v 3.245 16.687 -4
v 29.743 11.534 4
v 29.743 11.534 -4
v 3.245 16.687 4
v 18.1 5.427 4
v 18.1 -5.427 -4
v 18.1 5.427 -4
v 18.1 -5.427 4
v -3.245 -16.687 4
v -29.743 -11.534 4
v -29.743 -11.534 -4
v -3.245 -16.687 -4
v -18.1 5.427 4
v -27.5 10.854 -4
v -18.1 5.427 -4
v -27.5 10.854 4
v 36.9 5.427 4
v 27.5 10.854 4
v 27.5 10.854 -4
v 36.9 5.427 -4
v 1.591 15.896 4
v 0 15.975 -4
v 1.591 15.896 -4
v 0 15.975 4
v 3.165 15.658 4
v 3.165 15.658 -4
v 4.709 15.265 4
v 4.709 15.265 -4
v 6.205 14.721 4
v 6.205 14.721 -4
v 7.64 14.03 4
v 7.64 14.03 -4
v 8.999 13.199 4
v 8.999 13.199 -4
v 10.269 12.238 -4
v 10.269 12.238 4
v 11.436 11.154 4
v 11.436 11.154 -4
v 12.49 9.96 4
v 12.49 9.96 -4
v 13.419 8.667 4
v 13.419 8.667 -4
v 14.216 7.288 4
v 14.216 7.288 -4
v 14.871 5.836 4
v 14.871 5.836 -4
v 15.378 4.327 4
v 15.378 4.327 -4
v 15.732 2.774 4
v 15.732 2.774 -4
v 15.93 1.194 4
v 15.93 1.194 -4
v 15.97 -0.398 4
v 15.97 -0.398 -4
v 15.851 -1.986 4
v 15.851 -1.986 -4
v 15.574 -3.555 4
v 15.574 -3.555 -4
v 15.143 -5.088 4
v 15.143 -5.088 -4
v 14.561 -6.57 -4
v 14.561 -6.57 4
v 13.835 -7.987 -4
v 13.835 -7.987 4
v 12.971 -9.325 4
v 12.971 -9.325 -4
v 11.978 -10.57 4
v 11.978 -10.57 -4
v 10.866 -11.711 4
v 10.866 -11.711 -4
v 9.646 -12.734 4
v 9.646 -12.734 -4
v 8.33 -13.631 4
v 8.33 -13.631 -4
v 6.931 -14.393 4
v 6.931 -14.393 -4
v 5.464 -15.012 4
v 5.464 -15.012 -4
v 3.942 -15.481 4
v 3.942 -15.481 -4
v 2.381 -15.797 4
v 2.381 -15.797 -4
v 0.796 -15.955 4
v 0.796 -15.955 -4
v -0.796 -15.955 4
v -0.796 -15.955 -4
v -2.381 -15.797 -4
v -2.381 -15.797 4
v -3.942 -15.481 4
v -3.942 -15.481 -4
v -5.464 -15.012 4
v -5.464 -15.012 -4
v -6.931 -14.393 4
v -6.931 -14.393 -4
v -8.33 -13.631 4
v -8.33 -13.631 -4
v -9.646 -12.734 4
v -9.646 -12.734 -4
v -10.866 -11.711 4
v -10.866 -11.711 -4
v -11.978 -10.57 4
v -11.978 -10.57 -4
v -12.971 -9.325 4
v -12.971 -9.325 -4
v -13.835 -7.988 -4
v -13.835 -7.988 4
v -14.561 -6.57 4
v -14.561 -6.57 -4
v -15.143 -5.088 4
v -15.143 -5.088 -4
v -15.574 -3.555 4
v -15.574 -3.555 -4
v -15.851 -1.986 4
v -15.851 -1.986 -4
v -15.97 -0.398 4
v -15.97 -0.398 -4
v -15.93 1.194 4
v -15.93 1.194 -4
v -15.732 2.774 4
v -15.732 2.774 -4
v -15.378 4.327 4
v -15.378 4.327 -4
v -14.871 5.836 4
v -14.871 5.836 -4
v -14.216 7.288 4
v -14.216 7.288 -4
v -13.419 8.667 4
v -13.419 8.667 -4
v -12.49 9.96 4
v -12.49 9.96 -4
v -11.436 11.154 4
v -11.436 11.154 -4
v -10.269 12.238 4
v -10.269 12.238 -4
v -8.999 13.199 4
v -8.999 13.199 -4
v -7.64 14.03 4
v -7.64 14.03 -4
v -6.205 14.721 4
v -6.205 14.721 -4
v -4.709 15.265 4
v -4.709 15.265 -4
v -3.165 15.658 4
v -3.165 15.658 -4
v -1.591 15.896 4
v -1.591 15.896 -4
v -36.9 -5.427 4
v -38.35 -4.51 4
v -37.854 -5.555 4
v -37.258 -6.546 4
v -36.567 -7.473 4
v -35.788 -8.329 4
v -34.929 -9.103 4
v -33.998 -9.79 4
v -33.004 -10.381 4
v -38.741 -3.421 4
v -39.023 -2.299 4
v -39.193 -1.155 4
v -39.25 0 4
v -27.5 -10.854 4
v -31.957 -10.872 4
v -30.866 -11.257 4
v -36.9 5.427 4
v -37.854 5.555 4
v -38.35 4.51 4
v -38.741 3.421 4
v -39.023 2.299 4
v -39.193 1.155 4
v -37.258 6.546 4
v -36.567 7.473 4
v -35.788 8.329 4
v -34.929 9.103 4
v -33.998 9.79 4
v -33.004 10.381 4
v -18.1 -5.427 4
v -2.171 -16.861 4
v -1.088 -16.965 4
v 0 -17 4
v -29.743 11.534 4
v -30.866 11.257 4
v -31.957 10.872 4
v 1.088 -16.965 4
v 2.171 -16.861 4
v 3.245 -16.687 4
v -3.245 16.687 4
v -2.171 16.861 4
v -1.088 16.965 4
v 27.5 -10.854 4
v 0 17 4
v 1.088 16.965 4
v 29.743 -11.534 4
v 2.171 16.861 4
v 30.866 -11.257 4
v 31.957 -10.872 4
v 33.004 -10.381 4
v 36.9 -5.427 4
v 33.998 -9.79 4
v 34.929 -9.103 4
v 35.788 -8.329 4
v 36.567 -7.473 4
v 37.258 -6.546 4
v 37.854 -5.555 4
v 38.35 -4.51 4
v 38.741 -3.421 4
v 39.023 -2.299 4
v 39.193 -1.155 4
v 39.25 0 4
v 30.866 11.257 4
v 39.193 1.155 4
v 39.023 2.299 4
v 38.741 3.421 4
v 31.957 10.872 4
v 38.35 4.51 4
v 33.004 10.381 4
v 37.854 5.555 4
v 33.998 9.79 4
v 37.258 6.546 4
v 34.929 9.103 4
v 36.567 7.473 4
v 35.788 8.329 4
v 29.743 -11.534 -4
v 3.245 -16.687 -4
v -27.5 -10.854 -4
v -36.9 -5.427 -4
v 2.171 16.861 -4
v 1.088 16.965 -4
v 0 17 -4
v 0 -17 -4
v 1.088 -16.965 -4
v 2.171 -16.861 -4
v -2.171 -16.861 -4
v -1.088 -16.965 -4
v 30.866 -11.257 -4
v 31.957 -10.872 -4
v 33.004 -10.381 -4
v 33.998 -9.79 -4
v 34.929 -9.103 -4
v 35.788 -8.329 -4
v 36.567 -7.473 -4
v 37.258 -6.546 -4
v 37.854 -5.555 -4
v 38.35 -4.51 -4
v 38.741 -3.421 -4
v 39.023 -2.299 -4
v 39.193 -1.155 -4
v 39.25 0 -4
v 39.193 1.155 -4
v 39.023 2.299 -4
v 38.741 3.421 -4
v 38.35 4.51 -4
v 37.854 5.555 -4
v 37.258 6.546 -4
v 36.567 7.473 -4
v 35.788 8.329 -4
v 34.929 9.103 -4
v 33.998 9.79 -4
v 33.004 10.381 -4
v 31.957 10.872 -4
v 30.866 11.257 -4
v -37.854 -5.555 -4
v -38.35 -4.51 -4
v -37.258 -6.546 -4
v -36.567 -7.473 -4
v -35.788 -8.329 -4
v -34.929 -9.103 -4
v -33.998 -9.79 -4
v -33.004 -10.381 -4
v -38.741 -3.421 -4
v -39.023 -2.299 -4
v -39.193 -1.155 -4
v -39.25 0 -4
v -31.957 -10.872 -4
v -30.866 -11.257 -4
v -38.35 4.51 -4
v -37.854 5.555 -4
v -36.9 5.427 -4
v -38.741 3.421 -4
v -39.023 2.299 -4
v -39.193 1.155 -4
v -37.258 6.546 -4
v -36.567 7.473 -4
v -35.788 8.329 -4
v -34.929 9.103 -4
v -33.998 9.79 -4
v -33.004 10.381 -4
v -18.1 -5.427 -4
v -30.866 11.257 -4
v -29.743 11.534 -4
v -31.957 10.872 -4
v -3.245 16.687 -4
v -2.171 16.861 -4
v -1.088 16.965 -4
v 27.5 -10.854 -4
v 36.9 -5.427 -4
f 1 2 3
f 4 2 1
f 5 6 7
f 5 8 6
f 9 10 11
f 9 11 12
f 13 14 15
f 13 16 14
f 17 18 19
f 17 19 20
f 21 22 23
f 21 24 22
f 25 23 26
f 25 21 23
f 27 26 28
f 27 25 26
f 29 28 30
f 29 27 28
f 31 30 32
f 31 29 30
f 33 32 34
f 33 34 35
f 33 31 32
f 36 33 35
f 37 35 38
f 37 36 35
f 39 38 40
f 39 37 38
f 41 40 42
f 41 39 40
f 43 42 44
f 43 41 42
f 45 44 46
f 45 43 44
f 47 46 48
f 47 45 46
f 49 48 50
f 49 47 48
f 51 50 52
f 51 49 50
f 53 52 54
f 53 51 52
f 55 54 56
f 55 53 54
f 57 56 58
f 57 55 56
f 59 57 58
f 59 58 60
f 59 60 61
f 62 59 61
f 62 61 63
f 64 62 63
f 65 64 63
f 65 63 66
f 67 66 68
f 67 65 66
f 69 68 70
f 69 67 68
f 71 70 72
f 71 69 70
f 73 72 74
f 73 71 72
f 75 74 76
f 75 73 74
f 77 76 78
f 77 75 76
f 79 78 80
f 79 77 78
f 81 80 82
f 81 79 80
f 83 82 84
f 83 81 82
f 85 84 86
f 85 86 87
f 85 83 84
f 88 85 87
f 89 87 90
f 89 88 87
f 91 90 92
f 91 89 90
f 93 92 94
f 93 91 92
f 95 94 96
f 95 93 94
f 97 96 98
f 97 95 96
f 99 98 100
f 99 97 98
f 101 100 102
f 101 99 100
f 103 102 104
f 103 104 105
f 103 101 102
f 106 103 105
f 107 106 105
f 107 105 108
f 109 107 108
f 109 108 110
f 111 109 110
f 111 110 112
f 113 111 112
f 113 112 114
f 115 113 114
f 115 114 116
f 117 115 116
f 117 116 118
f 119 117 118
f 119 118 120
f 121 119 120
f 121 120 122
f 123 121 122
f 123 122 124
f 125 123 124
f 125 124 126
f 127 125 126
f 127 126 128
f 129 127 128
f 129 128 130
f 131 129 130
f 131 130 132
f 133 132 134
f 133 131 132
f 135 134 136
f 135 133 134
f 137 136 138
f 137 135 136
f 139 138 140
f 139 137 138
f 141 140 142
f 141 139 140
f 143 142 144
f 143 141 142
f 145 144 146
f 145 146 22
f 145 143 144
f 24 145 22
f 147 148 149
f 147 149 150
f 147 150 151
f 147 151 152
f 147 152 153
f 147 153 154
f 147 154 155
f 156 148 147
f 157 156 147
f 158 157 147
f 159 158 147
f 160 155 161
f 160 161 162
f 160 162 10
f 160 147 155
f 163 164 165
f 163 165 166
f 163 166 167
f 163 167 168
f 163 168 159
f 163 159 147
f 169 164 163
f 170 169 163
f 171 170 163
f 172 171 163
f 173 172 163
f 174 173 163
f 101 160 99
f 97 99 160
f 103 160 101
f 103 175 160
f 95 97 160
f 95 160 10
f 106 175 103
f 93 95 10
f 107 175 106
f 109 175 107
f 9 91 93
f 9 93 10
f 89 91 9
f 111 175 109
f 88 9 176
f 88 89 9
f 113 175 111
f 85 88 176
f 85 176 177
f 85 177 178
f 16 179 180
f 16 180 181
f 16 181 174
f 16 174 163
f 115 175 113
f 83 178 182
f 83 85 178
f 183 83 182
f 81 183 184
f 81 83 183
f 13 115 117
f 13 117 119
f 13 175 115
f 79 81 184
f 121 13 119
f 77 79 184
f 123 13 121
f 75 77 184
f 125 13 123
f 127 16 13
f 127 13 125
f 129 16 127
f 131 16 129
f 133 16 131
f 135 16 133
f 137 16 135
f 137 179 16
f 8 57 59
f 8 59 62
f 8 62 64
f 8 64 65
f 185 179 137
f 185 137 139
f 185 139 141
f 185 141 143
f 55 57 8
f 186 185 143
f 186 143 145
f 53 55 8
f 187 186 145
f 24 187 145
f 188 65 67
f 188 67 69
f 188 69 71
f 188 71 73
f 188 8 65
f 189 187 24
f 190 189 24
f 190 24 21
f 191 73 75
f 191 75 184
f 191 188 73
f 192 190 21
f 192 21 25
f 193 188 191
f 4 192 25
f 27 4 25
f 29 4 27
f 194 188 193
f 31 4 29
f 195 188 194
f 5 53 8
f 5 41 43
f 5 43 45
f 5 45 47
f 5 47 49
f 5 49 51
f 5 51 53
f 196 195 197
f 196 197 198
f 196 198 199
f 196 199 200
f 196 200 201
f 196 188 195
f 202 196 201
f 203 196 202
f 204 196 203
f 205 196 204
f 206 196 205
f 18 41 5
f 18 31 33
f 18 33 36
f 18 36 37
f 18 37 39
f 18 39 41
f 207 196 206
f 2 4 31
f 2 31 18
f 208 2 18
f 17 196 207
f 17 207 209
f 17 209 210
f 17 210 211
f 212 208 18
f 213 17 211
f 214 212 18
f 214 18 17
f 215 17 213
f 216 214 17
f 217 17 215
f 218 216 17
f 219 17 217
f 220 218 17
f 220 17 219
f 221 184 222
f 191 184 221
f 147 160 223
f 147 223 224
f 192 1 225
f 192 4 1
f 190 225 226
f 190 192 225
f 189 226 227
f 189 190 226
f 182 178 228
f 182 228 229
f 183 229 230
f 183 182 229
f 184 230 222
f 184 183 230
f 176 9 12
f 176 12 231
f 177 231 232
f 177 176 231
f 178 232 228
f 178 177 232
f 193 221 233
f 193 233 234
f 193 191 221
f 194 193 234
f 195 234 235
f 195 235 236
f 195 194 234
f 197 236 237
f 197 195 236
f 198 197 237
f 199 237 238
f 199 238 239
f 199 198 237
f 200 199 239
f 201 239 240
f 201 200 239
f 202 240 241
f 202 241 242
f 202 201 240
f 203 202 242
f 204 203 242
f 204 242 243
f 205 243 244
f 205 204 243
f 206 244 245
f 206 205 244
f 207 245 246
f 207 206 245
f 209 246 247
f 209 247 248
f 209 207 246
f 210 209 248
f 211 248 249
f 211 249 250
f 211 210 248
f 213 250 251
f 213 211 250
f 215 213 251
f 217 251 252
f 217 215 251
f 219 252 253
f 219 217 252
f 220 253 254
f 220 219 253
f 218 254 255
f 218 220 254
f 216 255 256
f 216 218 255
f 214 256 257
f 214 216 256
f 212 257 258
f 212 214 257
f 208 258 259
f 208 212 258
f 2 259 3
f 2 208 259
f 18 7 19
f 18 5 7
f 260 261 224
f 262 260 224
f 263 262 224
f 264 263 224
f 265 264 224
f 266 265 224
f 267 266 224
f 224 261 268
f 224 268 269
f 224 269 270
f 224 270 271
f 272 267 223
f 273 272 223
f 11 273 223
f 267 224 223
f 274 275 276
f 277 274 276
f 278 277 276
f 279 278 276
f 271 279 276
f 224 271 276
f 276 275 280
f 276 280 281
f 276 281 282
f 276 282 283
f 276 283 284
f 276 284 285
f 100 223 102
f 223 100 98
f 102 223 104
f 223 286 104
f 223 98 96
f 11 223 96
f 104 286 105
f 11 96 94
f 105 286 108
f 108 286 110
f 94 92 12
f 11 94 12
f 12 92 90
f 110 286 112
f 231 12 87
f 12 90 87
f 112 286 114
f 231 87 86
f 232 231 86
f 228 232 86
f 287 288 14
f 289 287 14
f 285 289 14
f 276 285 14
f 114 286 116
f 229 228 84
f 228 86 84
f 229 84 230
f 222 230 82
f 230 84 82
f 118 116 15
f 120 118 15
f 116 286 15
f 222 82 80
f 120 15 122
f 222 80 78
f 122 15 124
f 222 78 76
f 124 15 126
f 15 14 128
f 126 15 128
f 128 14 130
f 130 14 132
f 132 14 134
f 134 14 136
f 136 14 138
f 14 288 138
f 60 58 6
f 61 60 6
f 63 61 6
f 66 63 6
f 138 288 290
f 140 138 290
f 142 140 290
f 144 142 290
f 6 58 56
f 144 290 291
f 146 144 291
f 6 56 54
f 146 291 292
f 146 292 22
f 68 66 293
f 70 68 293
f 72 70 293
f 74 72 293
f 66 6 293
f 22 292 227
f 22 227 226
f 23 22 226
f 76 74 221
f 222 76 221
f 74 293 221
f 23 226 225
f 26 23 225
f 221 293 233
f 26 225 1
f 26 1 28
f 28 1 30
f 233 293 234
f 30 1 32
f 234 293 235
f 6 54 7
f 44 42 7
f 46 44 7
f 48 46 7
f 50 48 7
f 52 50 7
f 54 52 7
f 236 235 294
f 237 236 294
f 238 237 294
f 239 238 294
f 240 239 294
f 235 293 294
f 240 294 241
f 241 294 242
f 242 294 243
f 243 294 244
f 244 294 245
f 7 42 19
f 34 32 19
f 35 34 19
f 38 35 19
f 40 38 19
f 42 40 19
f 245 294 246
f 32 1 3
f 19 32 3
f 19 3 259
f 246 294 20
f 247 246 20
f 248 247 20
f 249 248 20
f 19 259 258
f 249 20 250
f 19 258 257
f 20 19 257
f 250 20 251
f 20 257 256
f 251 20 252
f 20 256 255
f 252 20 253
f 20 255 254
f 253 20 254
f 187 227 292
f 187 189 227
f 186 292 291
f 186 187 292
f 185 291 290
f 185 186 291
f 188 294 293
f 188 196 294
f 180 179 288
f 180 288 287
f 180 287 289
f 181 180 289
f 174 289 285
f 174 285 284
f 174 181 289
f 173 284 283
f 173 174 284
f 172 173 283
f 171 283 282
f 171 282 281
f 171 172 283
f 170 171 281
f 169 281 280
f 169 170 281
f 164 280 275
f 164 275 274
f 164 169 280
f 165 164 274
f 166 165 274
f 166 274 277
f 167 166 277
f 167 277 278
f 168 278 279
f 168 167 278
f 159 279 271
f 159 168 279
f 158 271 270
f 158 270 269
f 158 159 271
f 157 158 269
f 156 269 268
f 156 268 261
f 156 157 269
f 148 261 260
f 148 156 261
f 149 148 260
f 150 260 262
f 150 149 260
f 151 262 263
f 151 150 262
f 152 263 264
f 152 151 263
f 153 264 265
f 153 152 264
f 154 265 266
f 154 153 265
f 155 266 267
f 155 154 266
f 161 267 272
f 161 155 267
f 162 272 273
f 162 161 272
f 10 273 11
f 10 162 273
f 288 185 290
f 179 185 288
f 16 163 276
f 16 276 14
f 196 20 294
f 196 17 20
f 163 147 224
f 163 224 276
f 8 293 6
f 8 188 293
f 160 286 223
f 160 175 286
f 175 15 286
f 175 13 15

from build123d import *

# Parameters (mm, degrees)
F1_DEPTH = 4


with BuildPart() as f1:
    # F0 (on Top) → F1 (new body, symmetric)
    with BuildSketch(Plane.XY):
        with BuildLine():
            Line((-3.245455, 16.687331), (-29.743182, 11.533891))
            ThreePointArc((-29.743182, 11.533891), (-39.25, 0), (-29.743182, -11.533891))
            Line((-29.743182, -11.533891), (-3.245455, -16.687331))
            ThreePointArc((-3.245455, -16.687331), (-1.630241, -16.921652), (0, -17))
            ThreePointArc((0, -17), (1.630241, -16.921652), (3.245455, -16.687331))
            Line((3.245455, -16.687331), (29.743182, -11.533891))
            ThreePointArc((29.743182, -11.533891), (39.25, 0), (29.743182, 11.533891))
            Line((29.743182, 11.533891), (3.245455, 16.687331))
            ThreePointArc((3.245455, 16.687331), (1.630241, 16.921652), (0, 17))
            ThreePointArc((0, 17), (-1.630241, 16.921652), (-3.245455, 16.687331))
        make_face()
        Polygon((-27.5, -10.854185), (-36.9, -5.427093), (-36.9, 5.427093), (-27.5, 10.854185), (-18.1, 5.427093), (-18.1, -5.427093), align=None, mode=Mode.SUBTRACT)
        with BuildLine():
            ThreePointArc((0, -15.975), (-15.975, 0), (0, 15.975))
            ThreePointArc((0, 15.975), (15.975, 0), (0, -15.975))
        make_face(mode=Mode.SUBTRACT)
        Polygon((27.5, 10.854185), (36.9, 5.427093), (36.9, -5.427093), (27.5, -10.854185), (18.1, -5.427093), (18.1, 5.427093), align=None, mode=Mode.SUBTRACT)
    extrude(amount=F1_DEPTH, both=True)


solid = f1.part
